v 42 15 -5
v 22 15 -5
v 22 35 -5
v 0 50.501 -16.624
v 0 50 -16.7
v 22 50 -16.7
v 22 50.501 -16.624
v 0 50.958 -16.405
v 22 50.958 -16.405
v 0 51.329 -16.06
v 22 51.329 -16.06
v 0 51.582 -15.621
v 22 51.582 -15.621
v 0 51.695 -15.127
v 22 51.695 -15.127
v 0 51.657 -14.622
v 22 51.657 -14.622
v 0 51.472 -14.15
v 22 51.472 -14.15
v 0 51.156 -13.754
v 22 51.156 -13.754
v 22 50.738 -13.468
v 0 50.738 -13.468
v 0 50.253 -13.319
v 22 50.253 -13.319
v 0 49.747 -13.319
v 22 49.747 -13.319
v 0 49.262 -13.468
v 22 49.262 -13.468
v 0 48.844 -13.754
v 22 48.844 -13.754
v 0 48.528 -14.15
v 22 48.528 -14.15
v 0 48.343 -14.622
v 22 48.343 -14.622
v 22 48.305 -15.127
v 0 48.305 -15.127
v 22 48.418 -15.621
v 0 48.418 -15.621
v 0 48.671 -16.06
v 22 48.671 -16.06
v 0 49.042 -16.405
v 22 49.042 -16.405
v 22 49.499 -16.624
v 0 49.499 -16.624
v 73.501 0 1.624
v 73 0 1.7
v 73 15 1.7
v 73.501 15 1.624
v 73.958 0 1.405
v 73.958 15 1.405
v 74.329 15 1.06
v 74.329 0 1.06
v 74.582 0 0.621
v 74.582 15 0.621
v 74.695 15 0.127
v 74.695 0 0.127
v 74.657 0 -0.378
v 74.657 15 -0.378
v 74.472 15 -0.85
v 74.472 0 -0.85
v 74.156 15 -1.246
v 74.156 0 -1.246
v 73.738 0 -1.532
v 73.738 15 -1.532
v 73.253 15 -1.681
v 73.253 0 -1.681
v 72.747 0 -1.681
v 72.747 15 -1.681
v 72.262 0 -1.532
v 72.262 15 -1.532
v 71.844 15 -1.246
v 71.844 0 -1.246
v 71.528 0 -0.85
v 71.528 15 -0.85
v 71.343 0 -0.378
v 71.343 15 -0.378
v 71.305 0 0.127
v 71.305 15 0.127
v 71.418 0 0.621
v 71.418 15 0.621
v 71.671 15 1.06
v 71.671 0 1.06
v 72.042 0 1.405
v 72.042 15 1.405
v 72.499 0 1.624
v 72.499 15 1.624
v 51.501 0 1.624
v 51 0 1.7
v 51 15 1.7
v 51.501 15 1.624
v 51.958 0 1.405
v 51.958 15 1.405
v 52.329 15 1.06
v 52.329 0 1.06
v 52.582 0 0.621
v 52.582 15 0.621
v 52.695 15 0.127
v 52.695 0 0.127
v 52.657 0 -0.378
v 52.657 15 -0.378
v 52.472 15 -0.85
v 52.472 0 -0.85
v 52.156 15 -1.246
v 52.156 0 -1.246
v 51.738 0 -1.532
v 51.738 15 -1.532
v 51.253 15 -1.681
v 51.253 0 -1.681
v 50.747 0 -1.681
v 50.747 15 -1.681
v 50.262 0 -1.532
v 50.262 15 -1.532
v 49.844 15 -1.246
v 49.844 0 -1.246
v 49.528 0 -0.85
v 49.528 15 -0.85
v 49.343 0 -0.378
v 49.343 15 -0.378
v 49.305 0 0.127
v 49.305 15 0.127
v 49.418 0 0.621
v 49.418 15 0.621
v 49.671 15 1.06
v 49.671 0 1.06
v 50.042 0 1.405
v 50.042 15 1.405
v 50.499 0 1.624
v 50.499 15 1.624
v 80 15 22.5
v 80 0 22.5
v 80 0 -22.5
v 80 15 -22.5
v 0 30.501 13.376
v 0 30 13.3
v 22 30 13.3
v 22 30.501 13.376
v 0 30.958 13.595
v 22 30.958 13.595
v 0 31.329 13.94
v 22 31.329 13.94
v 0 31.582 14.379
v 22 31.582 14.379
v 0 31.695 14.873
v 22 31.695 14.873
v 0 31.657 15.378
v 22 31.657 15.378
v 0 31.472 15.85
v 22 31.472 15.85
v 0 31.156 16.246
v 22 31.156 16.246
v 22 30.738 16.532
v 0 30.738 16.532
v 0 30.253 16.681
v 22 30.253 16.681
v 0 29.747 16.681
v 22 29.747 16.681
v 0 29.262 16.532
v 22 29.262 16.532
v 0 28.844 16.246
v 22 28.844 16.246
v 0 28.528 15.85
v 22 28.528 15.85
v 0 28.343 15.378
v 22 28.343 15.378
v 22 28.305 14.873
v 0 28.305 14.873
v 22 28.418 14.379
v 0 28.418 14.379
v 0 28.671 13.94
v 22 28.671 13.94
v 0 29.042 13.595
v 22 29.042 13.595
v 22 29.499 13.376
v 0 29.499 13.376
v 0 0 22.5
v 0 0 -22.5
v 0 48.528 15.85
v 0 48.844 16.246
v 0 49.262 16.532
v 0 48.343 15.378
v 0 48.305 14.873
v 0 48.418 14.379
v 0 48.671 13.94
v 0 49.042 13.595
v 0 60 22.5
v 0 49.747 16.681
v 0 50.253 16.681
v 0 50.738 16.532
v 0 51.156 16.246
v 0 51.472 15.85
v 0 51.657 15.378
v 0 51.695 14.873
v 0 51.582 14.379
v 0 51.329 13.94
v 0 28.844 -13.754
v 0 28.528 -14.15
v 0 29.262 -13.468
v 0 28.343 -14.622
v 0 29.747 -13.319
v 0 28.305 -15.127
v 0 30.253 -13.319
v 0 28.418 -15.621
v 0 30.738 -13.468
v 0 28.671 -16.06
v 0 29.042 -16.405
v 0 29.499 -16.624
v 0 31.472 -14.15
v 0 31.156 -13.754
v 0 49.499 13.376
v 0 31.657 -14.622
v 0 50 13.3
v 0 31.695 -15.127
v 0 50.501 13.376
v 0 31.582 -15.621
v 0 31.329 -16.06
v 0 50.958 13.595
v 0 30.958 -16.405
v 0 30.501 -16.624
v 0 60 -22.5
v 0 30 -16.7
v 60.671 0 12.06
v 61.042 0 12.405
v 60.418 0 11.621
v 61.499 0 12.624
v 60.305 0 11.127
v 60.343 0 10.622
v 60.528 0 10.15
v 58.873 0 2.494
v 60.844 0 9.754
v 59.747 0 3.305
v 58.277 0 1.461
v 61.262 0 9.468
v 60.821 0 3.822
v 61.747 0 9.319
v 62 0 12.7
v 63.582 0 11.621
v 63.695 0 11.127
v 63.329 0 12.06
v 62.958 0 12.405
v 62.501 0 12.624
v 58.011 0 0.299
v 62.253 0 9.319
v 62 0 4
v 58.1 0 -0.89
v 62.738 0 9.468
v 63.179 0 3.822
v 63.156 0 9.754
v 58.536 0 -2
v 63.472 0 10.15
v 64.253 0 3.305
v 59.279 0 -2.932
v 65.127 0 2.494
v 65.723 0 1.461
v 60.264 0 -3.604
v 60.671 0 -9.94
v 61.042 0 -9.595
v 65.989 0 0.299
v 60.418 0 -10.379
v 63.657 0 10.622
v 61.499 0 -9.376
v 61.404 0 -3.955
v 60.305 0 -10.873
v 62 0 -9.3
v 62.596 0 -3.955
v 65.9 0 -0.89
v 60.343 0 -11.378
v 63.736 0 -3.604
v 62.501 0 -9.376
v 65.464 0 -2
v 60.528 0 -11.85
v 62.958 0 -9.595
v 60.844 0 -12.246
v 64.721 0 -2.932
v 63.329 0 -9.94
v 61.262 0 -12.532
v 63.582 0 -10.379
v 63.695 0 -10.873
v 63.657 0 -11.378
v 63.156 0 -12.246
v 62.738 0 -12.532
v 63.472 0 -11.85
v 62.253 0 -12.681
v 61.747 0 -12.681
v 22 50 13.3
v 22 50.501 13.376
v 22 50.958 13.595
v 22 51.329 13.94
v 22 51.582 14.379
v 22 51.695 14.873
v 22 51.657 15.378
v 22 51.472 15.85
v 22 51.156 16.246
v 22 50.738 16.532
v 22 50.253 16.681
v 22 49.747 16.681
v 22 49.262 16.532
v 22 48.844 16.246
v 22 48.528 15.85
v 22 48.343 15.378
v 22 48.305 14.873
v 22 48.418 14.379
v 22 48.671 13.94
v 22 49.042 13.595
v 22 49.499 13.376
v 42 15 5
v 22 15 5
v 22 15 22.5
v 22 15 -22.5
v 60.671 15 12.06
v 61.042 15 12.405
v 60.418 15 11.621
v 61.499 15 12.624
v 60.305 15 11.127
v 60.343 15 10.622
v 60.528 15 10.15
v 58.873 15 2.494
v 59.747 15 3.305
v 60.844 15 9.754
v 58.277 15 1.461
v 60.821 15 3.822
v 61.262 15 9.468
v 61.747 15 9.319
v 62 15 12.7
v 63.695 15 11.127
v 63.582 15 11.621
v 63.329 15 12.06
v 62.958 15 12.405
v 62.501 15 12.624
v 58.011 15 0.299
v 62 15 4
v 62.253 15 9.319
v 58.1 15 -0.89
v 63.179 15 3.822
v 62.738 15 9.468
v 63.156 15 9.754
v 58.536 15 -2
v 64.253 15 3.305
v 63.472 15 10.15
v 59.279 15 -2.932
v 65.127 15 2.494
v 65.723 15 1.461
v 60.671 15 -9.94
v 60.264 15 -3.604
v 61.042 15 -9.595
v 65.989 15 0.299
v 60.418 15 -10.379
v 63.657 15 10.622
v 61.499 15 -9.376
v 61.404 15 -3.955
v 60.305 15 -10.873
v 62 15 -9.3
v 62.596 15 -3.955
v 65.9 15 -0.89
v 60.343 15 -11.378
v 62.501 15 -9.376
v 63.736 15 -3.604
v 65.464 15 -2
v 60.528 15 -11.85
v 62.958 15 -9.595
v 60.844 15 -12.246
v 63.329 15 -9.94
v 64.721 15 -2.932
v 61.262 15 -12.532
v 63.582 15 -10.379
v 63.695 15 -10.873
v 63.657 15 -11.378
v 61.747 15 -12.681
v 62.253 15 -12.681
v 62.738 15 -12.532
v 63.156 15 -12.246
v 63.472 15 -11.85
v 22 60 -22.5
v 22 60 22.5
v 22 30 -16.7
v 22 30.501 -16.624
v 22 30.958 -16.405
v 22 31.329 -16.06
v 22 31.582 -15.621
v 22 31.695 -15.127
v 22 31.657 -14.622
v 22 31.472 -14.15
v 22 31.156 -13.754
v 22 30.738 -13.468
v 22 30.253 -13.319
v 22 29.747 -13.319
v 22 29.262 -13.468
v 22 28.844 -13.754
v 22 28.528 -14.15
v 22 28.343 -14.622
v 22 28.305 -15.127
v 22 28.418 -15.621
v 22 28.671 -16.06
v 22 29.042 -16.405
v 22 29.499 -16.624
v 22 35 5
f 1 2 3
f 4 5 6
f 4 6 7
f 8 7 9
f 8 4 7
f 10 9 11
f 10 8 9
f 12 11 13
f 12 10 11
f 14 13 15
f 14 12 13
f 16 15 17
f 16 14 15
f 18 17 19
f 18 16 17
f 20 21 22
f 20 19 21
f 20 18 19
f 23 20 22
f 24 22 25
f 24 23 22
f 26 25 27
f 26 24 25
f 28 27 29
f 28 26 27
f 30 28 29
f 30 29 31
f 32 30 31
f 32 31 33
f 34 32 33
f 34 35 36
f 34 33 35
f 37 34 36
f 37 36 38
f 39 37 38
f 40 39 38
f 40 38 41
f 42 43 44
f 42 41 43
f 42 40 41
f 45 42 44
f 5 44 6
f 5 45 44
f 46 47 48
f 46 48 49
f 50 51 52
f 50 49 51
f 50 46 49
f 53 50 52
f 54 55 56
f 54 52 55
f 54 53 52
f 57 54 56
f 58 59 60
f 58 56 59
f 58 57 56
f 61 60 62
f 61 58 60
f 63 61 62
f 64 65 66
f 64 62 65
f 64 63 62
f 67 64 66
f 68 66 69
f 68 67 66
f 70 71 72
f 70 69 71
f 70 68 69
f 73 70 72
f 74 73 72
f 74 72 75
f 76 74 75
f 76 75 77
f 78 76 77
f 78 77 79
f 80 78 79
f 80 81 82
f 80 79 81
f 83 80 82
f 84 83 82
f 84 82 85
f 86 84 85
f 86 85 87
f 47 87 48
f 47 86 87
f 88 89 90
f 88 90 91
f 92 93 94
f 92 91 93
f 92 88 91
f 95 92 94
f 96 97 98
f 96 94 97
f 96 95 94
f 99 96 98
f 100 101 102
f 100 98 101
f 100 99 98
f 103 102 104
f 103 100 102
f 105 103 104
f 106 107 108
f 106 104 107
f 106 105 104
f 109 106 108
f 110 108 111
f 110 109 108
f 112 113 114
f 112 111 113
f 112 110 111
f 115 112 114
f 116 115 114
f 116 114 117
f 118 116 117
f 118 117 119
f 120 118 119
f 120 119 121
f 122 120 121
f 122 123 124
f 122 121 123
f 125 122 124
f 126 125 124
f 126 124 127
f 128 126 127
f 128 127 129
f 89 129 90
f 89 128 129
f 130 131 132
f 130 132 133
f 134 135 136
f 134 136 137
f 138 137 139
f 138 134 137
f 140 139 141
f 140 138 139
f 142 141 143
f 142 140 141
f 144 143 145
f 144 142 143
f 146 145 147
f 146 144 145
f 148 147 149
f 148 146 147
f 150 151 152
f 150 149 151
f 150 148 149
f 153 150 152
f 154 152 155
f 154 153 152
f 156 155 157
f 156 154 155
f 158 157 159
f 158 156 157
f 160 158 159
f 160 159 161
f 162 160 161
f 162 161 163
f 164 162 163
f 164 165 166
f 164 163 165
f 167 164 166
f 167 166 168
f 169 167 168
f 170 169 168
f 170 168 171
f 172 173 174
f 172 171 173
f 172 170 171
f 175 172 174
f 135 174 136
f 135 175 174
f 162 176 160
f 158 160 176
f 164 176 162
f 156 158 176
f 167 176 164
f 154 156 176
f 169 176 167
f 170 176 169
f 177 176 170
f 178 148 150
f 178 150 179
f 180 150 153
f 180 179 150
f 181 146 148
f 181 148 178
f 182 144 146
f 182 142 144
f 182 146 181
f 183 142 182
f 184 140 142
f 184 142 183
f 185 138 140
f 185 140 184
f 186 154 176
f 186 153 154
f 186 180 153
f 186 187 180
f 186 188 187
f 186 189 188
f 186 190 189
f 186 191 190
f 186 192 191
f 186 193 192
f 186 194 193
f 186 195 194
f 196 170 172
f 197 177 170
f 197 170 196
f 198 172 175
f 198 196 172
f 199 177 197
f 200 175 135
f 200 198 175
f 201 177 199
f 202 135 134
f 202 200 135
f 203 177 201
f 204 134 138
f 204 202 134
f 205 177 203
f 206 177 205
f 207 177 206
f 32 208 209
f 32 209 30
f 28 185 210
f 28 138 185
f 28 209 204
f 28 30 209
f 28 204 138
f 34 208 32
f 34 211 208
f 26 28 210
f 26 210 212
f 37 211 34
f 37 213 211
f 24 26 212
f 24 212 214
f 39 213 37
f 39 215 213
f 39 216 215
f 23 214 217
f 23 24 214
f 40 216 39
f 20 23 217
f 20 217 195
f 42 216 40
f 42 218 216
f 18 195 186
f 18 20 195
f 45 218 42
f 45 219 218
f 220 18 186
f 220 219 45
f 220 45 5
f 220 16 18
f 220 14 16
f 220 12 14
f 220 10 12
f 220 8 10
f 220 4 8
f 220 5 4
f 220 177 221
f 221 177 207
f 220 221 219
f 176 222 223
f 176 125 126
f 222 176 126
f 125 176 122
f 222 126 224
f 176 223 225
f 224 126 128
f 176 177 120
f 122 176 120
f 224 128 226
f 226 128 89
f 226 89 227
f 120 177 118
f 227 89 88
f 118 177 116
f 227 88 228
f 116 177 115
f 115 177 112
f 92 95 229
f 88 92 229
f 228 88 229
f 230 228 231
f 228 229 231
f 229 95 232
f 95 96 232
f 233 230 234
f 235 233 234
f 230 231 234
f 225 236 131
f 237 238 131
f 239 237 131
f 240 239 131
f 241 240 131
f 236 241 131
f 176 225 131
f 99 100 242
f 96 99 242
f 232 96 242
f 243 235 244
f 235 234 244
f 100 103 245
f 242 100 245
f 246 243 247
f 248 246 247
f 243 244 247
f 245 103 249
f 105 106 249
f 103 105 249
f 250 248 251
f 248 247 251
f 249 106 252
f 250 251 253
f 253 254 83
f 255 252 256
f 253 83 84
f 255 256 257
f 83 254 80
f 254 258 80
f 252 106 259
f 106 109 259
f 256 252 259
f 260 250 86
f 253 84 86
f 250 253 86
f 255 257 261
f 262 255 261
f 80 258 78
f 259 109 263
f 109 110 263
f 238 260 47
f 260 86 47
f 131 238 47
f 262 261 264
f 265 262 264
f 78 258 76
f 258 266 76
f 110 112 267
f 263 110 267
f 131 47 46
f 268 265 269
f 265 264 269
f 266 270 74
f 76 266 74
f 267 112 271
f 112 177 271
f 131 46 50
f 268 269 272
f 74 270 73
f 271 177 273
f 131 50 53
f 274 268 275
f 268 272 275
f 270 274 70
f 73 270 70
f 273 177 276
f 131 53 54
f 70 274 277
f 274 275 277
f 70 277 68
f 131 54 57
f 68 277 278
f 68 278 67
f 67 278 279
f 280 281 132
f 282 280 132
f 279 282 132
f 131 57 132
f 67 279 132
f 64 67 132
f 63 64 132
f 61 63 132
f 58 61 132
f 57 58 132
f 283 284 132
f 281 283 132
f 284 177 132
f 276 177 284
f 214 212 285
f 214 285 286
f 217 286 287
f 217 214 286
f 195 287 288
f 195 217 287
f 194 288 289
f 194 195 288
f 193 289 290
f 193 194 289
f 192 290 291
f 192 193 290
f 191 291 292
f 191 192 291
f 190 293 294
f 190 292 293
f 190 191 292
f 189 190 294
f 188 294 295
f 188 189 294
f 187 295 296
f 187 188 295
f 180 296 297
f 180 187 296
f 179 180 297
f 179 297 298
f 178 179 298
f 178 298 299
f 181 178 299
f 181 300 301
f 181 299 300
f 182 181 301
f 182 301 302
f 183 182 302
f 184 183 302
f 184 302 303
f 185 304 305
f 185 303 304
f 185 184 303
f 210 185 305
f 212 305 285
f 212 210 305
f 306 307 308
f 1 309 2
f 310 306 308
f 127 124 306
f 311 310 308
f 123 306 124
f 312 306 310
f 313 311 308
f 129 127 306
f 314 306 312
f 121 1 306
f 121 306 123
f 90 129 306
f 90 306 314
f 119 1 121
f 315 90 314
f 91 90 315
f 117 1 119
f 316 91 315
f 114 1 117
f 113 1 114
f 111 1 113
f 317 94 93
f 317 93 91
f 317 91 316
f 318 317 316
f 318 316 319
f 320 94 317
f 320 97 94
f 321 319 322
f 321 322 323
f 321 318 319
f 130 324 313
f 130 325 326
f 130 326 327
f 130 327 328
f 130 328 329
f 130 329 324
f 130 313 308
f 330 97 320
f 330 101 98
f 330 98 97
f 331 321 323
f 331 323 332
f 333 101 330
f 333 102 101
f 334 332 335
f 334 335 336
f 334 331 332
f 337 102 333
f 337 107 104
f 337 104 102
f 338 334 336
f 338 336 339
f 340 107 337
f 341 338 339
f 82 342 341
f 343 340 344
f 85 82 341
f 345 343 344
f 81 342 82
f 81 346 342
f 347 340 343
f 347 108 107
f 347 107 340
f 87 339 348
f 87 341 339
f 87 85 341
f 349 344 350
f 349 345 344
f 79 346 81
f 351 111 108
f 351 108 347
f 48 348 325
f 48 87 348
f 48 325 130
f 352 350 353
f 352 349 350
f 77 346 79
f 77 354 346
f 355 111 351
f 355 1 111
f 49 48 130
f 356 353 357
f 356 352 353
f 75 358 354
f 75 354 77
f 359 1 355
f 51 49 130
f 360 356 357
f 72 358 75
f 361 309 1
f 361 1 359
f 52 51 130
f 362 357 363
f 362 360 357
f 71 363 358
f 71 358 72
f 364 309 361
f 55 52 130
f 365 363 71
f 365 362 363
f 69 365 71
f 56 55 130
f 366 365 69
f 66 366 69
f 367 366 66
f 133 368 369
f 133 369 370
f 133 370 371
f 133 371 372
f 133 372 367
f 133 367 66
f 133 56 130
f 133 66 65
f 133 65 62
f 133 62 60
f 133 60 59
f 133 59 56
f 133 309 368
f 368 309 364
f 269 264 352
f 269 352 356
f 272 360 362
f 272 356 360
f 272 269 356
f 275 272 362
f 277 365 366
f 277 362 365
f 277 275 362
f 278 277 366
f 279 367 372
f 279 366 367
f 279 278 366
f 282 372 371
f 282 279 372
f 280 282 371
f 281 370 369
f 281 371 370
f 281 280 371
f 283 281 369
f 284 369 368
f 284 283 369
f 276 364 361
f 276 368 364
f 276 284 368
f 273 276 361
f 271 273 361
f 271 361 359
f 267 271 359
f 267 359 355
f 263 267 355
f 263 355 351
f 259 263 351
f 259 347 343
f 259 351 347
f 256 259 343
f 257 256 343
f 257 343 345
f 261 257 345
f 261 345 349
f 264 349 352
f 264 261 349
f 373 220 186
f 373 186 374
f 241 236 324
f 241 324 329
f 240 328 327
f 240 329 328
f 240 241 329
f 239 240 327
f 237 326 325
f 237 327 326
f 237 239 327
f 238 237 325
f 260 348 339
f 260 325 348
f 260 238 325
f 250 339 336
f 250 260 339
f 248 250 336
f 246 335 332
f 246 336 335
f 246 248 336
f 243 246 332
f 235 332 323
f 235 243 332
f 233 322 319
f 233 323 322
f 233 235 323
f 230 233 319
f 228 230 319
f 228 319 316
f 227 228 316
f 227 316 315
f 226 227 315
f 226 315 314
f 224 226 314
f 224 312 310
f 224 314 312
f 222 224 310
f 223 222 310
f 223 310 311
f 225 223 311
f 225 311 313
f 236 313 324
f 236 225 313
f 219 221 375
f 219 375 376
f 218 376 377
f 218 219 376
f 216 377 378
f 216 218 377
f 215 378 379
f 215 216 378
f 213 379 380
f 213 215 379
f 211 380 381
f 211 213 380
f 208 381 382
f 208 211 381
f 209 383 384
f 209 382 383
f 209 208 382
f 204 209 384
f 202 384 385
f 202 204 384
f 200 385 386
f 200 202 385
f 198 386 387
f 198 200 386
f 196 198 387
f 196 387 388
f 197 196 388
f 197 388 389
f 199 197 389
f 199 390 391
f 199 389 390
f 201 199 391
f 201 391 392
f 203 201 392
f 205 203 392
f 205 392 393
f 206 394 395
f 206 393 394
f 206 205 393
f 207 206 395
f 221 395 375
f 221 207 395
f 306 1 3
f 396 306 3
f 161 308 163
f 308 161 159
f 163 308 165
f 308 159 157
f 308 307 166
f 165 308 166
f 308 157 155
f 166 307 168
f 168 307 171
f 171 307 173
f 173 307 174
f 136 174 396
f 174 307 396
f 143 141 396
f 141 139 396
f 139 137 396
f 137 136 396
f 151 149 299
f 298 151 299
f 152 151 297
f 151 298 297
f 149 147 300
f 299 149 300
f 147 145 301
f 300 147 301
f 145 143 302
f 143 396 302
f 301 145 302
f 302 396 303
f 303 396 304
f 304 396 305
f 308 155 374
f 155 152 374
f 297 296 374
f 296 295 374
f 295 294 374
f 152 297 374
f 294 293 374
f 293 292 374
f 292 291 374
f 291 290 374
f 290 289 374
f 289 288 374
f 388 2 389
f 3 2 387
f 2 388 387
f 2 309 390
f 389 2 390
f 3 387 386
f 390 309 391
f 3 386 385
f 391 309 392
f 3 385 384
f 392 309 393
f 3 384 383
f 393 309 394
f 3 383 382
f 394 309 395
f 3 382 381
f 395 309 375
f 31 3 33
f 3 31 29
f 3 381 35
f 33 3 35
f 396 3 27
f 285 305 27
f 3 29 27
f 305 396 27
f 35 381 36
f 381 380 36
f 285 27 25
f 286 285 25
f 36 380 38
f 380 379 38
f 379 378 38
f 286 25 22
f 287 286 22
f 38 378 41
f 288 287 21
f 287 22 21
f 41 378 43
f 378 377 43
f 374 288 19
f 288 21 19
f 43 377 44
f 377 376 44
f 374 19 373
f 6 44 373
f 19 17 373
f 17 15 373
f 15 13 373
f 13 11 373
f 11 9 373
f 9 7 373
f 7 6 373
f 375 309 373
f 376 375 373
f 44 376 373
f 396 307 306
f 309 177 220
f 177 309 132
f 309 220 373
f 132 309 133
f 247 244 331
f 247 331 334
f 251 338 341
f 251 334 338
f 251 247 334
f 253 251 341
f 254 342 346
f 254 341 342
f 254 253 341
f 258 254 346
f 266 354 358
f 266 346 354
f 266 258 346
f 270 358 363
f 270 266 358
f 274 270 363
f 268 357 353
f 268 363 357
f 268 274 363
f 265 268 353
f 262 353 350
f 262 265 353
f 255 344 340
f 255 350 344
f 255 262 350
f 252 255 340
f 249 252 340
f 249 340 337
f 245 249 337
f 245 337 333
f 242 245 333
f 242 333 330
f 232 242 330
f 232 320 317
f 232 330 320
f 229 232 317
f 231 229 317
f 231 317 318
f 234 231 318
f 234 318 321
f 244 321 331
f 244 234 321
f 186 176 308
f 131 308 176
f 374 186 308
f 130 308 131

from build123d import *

# Parameters (mm, degrees)
BOSS_EXTRUDE3_DEPTH      = 22.5
BOSS_EXTRUDE3_DEPTH_BACK = 22.5
SKETCH1_W                = 22
SKETCH1_H                = 60
BOSS_EXTRUDE4_DEPTH      = 22.5
BOSS_EXTRUDE4_DEPTH_BACK = 22.5
SKETCH2_W                = 80
SKETCH2_H                = 15
CUT_EXTRUDE1_DEPTH       = 103.5
CUT_EXTRUDE1_DEPTH_BACK  = 103.5
SKETCH3_R                = 4
SKETCH3_R_2              = 1.7
CUT_EXTRUDE2_DEPTH       = 103.5
CUT_EXTRUDE2_DEPTH_BACK  = 103.5
SKETCH4_R                = 1.7
BOSS_EXTRUDE5_DEPTH      = 5
BOSS_EXTRUDE5_DEPTH_BACK = 5


with BuildPart() as part:
    # Sketch1 → Boss-Extrude3 (new, two sides: drawn at the far end of the back side and taken through both)
    with BuildSketch(Plane.XY.offset(-BOSS_EXTRUDE3_DEPTH_BACK)):
        with Locations((11, 30)):
            Rectangle(SKETCH1_W, SKETCH1_H)
    extrude(amount=BOSS_EXTRUDE3_DEPTH + BOSS_EXTRUDE3_DEPTH_BACK)

    # Sketch2 → Boss-Extrude4 (add, two sides: drawn at the far end of the back side and taken through both)
    with BuildSketch(Plane.XY.offset(-BOSS_EXTRUDE4_DEPTH_BACK)):
        with Locations((40, 7.5)):
            Rectangle(SKETCH2_W, SKETCH2_H)
    extrude(amount=BOSS_EXTRUDE4_DEPTH + BOSS_EXTRUDE4_DEPTH_BACK)

    # Sketch3 → Cut-Extrude1 (cut, two sides: drawn at the far end of the back side and taken through both)
    with BuildSketch(Plane(origin=(0, 0, 0), x_dir=(1, 0, 0), z_dir=(0, 1, 0)).offset(-CUT_EXTRUDE1_DEPTH_BACK)):
        with Locations((62, 0)):
            Circle(SKETCH3_R)
        with Locations((73, 0)):
            Circle(SKETCH3_R_2)
        with Locations((51, 0)):
            Circle(SKETCH3_R_2)
        with Locations((62, 11)):
            Circle(SKETCH3_R_2)
        with Locations((62, -11)):
            Circle(SKETCH3_R_2)
    extrude(amount=CUT_EXTRUDE1_DEPTH + CUT_EXTRUDE1_DEPTH_BACK, mode=Mode.SUBTRACT)

    # Sketch4 → Cut-Extrude2 (cut, two sides: drawn at the far end of the back side and taken through both)
    with BuildSketch(Plane(origin=(0, 0, 0), x_dir=(0, 0, -1), z_dir=(1, 0, 0)).offset(-CUT_EXTRUDE2_DEPTH_BACK)):
        with Locations((15, 30)):
            Circle(SKETCH4_R)
        with Locations((-15, 30)):
            Circle(SKETCH4_R)
        with Locations((15, 50)):
            Circle(SKETCH4_R)
        with Locations((-15, 50)):
            Circle(SKETCH4_R)
    extrude(amount=CUT_EXTRUDE2_DEPTH + CUT_EXTRUDE2_DEPTH_BACK, mode=Mode.SUBTRACT)

    # Sketch5 → Boss-Extrude5 (add, two sides: drawn at the far end of the back side and taken through both)
    with BuildSketch(Plane.XY.offset(-BOSS_EXTRUDE5_DEPTH_BACK)):
        Polygon((22, 15), (42, 15), (22, 35), align=None)
    extrude(amount=BOSS_EXTRUDE5_DEPTH + BOSS_EXTRUDE5_DEPTH_BACK)


solid = part.part
